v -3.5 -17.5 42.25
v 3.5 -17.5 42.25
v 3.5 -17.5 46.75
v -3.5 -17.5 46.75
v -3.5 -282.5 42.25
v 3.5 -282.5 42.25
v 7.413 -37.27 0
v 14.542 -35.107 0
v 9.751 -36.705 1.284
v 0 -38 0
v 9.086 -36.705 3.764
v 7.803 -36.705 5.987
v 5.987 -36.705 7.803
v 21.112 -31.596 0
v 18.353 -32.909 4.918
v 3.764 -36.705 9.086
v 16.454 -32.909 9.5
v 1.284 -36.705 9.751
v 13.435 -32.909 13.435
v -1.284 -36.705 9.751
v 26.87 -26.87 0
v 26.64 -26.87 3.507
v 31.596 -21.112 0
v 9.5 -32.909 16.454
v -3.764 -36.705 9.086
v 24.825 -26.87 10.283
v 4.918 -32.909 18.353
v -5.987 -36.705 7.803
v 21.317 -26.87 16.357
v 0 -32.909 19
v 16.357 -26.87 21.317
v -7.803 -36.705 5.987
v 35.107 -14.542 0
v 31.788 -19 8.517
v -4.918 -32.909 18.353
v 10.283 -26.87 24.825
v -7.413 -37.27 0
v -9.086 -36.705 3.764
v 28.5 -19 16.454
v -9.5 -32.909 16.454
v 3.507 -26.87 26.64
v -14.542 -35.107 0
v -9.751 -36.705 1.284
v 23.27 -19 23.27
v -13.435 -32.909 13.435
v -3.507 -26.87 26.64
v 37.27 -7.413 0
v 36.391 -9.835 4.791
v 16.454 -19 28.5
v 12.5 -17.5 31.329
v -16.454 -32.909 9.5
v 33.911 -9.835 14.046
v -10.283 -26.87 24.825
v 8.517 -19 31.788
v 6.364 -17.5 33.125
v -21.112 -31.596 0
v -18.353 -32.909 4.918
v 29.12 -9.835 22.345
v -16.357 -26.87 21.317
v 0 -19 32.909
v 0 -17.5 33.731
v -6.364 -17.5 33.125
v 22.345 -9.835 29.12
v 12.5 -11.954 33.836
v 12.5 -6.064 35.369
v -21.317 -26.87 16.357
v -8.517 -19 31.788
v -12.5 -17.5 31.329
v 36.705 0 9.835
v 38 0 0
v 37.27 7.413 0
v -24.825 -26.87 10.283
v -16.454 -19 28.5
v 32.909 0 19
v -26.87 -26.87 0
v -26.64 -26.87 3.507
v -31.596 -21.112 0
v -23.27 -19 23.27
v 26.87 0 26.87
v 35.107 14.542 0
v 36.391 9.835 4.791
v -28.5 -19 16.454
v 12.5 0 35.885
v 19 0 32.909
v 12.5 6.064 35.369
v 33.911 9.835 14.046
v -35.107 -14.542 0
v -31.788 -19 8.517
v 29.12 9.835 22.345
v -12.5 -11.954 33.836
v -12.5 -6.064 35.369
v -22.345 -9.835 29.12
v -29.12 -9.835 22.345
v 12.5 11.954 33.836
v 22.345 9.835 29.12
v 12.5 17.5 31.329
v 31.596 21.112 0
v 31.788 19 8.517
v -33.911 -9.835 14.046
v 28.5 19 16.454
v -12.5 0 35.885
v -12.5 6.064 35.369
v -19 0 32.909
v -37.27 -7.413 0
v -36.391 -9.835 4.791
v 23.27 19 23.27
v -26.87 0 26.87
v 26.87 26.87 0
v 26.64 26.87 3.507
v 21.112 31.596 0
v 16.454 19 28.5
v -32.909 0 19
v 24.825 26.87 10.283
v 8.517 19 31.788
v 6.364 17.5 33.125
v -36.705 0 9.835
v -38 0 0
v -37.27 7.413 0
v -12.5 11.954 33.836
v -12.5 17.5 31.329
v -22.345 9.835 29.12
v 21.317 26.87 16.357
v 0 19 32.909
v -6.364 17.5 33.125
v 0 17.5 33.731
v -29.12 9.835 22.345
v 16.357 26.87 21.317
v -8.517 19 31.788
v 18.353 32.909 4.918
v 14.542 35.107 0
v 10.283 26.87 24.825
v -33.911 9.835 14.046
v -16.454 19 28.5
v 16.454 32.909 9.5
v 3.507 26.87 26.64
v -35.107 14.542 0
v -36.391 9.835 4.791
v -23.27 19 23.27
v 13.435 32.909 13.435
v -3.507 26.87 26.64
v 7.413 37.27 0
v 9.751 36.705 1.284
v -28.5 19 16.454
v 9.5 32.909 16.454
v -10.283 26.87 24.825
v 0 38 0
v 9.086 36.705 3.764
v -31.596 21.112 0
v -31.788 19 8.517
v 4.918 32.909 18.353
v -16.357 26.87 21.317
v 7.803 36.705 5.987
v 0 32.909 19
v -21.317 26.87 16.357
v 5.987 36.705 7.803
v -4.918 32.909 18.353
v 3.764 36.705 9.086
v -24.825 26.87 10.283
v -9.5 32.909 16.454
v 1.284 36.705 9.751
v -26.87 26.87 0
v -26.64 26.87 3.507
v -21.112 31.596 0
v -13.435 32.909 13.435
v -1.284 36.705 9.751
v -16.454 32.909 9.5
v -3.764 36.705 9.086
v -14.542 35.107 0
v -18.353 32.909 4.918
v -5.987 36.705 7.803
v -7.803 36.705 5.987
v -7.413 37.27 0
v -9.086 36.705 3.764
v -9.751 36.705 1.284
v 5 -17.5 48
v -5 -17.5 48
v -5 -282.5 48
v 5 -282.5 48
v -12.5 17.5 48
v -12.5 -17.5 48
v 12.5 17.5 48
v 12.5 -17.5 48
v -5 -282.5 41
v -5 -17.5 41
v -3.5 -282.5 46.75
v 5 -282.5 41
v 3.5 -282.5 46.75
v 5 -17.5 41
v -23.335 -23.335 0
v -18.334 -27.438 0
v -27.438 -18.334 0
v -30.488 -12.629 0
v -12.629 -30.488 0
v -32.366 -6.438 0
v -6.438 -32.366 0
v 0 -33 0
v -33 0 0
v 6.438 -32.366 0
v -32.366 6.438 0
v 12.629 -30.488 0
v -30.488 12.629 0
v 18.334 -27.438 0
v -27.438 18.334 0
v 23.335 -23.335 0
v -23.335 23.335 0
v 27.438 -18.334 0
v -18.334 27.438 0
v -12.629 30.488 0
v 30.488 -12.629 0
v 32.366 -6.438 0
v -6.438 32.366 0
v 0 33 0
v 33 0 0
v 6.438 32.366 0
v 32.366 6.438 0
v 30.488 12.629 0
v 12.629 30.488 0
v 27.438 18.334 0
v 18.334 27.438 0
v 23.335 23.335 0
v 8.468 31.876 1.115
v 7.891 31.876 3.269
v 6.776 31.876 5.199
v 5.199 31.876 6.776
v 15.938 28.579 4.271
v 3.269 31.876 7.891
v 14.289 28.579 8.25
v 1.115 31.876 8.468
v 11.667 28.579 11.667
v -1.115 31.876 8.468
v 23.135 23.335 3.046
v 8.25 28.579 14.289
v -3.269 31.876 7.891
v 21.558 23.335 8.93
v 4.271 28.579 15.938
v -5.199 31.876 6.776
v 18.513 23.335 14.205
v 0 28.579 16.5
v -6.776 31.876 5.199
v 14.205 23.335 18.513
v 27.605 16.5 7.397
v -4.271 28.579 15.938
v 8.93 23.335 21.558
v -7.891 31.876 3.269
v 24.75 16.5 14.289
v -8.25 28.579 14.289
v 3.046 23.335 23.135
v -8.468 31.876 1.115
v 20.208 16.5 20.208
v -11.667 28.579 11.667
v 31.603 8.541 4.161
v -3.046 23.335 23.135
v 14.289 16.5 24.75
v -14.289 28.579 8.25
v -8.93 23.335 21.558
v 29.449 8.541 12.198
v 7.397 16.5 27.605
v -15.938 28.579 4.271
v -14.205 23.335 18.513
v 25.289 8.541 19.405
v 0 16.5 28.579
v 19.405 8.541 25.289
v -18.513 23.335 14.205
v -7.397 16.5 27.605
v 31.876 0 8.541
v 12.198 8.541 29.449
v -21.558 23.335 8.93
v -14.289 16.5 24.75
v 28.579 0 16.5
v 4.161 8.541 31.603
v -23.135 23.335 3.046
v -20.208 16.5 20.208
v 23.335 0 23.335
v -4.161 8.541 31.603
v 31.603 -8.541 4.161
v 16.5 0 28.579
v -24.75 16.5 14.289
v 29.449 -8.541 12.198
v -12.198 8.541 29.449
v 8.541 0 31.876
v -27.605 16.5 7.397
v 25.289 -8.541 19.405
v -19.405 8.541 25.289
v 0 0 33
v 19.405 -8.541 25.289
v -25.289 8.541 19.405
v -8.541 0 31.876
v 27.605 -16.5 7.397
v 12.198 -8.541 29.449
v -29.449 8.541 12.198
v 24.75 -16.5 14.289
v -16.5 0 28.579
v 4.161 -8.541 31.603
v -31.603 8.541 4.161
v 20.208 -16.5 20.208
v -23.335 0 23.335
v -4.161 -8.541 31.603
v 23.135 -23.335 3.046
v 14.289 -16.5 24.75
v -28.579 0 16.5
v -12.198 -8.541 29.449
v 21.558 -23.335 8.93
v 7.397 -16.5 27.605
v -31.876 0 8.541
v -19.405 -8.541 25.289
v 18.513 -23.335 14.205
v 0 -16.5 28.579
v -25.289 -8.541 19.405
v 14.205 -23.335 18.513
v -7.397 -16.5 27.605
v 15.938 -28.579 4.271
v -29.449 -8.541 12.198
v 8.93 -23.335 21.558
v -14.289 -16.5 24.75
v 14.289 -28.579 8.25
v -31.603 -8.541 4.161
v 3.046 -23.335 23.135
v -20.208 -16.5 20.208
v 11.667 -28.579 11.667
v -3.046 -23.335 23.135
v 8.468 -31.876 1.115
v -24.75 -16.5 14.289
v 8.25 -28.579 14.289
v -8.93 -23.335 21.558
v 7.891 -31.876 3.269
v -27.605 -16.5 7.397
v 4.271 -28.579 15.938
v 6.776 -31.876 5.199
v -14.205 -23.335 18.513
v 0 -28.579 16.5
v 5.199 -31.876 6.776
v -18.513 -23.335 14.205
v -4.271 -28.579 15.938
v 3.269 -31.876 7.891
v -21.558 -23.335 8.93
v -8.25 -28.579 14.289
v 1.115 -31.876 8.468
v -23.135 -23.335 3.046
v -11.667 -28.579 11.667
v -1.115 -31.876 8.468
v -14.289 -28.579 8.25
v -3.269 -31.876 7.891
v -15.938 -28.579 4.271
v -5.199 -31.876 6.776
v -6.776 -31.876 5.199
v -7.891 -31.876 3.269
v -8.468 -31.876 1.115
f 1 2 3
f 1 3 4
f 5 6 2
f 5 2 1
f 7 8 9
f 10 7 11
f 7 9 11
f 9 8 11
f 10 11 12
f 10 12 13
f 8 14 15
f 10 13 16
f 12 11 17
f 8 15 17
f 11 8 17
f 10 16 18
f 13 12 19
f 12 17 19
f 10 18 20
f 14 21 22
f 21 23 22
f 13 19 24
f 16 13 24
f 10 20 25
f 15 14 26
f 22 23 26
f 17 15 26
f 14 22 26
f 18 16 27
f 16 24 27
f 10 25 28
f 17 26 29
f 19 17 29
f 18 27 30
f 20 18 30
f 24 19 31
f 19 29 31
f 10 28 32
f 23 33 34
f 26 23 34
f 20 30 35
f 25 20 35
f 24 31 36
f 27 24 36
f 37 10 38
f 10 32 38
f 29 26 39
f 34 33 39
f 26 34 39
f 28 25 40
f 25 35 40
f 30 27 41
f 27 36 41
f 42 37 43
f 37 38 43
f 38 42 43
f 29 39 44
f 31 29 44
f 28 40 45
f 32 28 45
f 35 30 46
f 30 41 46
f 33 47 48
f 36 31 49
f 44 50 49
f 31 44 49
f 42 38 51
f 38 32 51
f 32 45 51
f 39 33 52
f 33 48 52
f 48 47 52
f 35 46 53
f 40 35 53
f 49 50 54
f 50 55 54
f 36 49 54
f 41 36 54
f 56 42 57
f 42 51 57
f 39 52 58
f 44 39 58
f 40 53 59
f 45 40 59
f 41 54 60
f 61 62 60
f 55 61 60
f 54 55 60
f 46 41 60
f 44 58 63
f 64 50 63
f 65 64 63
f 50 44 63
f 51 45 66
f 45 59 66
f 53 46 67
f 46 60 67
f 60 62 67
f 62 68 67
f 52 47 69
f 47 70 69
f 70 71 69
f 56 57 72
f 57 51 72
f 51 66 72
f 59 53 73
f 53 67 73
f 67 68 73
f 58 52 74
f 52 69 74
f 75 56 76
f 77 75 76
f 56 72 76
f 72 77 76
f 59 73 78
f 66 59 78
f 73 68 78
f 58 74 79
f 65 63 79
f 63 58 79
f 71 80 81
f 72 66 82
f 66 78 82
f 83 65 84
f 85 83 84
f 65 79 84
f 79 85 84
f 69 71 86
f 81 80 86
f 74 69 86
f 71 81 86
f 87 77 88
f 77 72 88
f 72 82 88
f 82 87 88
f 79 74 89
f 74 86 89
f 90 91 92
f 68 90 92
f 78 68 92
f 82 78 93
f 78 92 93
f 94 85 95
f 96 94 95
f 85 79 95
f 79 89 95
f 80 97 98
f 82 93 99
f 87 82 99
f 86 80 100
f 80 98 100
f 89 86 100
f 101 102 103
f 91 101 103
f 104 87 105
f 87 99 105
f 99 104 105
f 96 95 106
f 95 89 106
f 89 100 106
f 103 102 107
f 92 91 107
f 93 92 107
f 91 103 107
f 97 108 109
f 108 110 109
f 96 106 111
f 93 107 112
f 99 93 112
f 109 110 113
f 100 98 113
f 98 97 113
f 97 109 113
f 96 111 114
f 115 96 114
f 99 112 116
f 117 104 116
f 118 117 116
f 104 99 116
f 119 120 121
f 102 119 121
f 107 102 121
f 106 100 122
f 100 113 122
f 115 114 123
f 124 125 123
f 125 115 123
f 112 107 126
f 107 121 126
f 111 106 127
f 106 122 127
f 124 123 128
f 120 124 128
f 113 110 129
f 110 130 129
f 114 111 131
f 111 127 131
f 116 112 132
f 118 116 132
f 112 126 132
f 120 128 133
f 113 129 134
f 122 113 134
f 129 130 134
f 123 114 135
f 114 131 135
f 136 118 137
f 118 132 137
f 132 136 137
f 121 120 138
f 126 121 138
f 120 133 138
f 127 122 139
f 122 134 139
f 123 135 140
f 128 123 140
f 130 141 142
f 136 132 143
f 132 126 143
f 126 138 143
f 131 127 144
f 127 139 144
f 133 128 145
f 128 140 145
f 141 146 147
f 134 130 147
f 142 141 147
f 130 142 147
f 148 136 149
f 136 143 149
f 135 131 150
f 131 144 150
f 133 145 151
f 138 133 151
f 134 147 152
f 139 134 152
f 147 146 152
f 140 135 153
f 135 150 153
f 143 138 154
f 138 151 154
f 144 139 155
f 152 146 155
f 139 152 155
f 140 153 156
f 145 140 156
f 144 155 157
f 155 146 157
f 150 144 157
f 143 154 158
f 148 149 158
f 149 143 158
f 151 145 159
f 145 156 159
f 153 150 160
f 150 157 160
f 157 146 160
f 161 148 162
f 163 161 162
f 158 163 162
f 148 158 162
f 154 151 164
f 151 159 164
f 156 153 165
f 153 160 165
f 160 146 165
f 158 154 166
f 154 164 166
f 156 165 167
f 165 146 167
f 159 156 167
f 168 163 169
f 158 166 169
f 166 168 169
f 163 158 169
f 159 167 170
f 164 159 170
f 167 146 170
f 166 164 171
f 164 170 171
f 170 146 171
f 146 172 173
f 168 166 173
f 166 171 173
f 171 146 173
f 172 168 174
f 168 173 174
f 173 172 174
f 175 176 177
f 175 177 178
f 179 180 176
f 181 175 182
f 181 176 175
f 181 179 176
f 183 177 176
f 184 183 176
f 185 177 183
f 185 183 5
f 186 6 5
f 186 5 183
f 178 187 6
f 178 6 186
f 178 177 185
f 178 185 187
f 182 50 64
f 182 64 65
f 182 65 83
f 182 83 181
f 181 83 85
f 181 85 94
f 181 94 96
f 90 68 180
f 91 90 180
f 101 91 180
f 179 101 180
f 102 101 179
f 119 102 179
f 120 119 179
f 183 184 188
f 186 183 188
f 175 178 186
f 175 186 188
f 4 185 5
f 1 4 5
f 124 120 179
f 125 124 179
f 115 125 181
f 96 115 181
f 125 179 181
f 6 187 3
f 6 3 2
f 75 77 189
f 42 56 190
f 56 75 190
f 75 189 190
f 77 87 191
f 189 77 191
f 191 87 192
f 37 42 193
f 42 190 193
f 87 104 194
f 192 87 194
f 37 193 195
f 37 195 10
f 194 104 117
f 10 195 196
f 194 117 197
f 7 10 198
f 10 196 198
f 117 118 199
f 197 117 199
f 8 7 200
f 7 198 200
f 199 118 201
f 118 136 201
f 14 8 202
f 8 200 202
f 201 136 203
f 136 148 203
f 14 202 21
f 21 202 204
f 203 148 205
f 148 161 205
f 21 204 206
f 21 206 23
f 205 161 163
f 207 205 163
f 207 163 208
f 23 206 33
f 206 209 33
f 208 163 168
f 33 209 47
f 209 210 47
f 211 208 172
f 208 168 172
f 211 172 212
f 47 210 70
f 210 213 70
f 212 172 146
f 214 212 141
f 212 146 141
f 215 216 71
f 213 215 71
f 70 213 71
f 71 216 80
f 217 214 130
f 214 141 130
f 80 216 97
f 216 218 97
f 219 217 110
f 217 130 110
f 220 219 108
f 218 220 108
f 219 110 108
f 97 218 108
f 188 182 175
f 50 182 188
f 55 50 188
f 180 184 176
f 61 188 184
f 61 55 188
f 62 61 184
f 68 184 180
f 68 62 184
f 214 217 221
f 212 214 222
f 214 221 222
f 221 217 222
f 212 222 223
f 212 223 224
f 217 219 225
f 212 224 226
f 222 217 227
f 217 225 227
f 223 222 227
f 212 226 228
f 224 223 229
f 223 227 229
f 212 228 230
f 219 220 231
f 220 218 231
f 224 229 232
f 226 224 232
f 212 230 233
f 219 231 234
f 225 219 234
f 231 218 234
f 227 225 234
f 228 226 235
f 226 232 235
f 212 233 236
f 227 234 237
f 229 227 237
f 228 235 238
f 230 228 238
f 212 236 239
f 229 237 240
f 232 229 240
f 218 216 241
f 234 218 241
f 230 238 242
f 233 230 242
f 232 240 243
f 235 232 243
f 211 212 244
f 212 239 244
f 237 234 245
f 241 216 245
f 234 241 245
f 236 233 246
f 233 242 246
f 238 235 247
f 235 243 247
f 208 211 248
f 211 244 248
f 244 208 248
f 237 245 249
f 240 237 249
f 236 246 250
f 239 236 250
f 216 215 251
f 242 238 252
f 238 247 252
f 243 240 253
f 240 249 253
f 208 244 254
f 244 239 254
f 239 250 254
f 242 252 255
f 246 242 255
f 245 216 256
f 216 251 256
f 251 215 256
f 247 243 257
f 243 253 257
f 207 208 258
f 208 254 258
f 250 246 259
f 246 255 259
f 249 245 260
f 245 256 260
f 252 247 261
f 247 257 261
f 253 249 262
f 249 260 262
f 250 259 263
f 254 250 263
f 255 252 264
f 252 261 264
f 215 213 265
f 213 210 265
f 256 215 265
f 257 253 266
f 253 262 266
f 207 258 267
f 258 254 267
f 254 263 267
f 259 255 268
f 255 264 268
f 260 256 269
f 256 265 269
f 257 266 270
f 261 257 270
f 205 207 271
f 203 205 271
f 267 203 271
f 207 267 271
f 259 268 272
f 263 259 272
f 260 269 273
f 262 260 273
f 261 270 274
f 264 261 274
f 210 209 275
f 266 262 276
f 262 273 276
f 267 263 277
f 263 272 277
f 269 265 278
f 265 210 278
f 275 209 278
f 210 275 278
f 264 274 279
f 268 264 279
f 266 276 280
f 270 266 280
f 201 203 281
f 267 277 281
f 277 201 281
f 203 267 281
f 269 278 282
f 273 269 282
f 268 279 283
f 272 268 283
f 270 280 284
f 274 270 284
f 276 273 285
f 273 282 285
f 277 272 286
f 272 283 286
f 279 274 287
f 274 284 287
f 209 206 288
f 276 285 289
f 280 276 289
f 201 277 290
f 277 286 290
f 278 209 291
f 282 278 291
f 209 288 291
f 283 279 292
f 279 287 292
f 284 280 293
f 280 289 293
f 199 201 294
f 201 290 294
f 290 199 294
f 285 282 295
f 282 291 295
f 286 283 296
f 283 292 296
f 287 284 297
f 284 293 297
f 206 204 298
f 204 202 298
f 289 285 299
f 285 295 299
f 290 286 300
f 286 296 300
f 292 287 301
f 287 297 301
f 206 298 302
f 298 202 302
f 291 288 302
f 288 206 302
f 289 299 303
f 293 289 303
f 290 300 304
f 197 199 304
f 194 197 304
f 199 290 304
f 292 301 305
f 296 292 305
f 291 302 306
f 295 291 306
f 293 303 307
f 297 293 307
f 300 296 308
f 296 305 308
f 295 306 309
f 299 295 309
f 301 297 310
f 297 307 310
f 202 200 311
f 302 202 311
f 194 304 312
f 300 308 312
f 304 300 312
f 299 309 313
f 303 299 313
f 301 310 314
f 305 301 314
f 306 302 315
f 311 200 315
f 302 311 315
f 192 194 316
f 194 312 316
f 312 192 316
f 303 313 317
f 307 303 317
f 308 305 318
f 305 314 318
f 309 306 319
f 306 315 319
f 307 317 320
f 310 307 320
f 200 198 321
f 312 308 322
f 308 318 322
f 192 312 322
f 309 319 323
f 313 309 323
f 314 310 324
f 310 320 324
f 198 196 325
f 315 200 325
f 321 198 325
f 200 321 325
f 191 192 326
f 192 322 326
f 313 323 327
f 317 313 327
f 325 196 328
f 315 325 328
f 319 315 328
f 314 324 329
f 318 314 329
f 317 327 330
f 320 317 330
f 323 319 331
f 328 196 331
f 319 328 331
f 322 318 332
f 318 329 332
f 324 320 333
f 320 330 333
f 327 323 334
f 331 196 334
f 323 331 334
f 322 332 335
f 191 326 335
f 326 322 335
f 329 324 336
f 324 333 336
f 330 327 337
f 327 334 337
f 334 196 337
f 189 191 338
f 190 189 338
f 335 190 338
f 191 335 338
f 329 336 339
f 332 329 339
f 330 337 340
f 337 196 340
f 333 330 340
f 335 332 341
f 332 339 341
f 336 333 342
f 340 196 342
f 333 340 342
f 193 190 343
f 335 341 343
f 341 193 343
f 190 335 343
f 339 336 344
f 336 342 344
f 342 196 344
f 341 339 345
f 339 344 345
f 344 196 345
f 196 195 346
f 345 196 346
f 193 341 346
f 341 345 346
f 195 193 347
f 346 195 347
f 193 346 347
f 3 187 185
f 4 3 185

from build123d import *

# Parameters (mm, degrees)
REVOLVE1_ANGLE                  = 180
BOSS_EXTRUDE2_REACH             = 67.818
BOSS_EXTRUDE2_END_RADIUS        = 38
SKETCH2_W                       = 25
SKETCH2_H                       = 35
BOSS_EXTRUDE2_DIRECTION_2_DEPTH = 10
SKETCH5_W                       = 10
SKETCH5_H                       = 300
BOSS_EXTRUDE3_DEPTH             = 7
SKETCH6_W                       = 7
SKETCH6_H                       = 4.5
CUT_EXTRUDE1_DEPTH              = 265


with BuildPart() as part:
    # Sketch1 → Revolve1 (revolve)
    with BuildSketch(Plane.XY):
        with BuildLine():
            Line((0, 38), (0, 33))
            ThreePointArc((0, 33), (33, 0), (0, -33))
            Line((0, -33), (0, -38))
            ThreePointArc((0, -38), (38, 0), (0, 38))
        make_face()
    revolve(axis=Axis((0, -33, 0), (0, -1, 0)), revolution_arc=REVOLVE1_ANGLE)

    # Boss-Extrude2: up to this sphere (the profile starts outside it)
    boss_extrude2_end = Location((0, 0, 0)) * Sphere(BOSS_EXTRUDE2_END_RADIUS, mode=Mode.PRIVATE)
    # Sketch2 → Boss-Extrude2 (add, up to the surface)
    with BuildSketch(Plane(origin=(0, 0, 38), x_dir=(-1, 0, 0), z_dir=(0, 0, -1)), mode=Mode.PRIVATE) as boss_extrude2_sk1:
        Rectangle(SKETCH2_W, SKETCH2_H)
    boss_extrude2_tool1 = extrude(boss_extrude2_sk1.sketch, amount=BOSS_EXTRUDE2_REACH, mode=Mode.PRIVATE) - boss_extrude2_end
    add(boss_extrude2_tool1.solids().sort_by_distance((0, 0, 38))[0])

    # Sketch2 → Boss-Extrude2 direction 2 (add)
    with BuildSketch(Plane(origin=(0, 0, 38), x_dir=(-1, 0, 0), z_dir=(0, 0, -1))):
        Rectangle(SKETCH2_W, SKETCH2_H)
    extrude(amount=-BOSS_EXTRUDE2_DIRECTION_2_DEPTH)

    # Sketch5 → Boss-Extrude3 (add)
    with BuildSketch(Plane.XY.offset(48)):
        with Locations((0, -132.5)):
            Rectangle(SKETCH5_W, SKETCH5_H)
    extrude(amount=-BOSS_EXTRUDE3_DEPTH)

    # Sketch6 → Cut-Extrude1 (cut)
    with BuildSketch(Plane(origin=(0, -282.5, 0), x_dir=(-1, 0, 0), z_dir=(0, -1, 0))):
        with Locations((0, -44.5)):
            Rectangle(SKETCH6_W, SKETCH6_H)
    extrude(amount=-CUT_EXTRUDE1_DEPTH, mode=Mode.SUBTRACT)


solid = part.part
